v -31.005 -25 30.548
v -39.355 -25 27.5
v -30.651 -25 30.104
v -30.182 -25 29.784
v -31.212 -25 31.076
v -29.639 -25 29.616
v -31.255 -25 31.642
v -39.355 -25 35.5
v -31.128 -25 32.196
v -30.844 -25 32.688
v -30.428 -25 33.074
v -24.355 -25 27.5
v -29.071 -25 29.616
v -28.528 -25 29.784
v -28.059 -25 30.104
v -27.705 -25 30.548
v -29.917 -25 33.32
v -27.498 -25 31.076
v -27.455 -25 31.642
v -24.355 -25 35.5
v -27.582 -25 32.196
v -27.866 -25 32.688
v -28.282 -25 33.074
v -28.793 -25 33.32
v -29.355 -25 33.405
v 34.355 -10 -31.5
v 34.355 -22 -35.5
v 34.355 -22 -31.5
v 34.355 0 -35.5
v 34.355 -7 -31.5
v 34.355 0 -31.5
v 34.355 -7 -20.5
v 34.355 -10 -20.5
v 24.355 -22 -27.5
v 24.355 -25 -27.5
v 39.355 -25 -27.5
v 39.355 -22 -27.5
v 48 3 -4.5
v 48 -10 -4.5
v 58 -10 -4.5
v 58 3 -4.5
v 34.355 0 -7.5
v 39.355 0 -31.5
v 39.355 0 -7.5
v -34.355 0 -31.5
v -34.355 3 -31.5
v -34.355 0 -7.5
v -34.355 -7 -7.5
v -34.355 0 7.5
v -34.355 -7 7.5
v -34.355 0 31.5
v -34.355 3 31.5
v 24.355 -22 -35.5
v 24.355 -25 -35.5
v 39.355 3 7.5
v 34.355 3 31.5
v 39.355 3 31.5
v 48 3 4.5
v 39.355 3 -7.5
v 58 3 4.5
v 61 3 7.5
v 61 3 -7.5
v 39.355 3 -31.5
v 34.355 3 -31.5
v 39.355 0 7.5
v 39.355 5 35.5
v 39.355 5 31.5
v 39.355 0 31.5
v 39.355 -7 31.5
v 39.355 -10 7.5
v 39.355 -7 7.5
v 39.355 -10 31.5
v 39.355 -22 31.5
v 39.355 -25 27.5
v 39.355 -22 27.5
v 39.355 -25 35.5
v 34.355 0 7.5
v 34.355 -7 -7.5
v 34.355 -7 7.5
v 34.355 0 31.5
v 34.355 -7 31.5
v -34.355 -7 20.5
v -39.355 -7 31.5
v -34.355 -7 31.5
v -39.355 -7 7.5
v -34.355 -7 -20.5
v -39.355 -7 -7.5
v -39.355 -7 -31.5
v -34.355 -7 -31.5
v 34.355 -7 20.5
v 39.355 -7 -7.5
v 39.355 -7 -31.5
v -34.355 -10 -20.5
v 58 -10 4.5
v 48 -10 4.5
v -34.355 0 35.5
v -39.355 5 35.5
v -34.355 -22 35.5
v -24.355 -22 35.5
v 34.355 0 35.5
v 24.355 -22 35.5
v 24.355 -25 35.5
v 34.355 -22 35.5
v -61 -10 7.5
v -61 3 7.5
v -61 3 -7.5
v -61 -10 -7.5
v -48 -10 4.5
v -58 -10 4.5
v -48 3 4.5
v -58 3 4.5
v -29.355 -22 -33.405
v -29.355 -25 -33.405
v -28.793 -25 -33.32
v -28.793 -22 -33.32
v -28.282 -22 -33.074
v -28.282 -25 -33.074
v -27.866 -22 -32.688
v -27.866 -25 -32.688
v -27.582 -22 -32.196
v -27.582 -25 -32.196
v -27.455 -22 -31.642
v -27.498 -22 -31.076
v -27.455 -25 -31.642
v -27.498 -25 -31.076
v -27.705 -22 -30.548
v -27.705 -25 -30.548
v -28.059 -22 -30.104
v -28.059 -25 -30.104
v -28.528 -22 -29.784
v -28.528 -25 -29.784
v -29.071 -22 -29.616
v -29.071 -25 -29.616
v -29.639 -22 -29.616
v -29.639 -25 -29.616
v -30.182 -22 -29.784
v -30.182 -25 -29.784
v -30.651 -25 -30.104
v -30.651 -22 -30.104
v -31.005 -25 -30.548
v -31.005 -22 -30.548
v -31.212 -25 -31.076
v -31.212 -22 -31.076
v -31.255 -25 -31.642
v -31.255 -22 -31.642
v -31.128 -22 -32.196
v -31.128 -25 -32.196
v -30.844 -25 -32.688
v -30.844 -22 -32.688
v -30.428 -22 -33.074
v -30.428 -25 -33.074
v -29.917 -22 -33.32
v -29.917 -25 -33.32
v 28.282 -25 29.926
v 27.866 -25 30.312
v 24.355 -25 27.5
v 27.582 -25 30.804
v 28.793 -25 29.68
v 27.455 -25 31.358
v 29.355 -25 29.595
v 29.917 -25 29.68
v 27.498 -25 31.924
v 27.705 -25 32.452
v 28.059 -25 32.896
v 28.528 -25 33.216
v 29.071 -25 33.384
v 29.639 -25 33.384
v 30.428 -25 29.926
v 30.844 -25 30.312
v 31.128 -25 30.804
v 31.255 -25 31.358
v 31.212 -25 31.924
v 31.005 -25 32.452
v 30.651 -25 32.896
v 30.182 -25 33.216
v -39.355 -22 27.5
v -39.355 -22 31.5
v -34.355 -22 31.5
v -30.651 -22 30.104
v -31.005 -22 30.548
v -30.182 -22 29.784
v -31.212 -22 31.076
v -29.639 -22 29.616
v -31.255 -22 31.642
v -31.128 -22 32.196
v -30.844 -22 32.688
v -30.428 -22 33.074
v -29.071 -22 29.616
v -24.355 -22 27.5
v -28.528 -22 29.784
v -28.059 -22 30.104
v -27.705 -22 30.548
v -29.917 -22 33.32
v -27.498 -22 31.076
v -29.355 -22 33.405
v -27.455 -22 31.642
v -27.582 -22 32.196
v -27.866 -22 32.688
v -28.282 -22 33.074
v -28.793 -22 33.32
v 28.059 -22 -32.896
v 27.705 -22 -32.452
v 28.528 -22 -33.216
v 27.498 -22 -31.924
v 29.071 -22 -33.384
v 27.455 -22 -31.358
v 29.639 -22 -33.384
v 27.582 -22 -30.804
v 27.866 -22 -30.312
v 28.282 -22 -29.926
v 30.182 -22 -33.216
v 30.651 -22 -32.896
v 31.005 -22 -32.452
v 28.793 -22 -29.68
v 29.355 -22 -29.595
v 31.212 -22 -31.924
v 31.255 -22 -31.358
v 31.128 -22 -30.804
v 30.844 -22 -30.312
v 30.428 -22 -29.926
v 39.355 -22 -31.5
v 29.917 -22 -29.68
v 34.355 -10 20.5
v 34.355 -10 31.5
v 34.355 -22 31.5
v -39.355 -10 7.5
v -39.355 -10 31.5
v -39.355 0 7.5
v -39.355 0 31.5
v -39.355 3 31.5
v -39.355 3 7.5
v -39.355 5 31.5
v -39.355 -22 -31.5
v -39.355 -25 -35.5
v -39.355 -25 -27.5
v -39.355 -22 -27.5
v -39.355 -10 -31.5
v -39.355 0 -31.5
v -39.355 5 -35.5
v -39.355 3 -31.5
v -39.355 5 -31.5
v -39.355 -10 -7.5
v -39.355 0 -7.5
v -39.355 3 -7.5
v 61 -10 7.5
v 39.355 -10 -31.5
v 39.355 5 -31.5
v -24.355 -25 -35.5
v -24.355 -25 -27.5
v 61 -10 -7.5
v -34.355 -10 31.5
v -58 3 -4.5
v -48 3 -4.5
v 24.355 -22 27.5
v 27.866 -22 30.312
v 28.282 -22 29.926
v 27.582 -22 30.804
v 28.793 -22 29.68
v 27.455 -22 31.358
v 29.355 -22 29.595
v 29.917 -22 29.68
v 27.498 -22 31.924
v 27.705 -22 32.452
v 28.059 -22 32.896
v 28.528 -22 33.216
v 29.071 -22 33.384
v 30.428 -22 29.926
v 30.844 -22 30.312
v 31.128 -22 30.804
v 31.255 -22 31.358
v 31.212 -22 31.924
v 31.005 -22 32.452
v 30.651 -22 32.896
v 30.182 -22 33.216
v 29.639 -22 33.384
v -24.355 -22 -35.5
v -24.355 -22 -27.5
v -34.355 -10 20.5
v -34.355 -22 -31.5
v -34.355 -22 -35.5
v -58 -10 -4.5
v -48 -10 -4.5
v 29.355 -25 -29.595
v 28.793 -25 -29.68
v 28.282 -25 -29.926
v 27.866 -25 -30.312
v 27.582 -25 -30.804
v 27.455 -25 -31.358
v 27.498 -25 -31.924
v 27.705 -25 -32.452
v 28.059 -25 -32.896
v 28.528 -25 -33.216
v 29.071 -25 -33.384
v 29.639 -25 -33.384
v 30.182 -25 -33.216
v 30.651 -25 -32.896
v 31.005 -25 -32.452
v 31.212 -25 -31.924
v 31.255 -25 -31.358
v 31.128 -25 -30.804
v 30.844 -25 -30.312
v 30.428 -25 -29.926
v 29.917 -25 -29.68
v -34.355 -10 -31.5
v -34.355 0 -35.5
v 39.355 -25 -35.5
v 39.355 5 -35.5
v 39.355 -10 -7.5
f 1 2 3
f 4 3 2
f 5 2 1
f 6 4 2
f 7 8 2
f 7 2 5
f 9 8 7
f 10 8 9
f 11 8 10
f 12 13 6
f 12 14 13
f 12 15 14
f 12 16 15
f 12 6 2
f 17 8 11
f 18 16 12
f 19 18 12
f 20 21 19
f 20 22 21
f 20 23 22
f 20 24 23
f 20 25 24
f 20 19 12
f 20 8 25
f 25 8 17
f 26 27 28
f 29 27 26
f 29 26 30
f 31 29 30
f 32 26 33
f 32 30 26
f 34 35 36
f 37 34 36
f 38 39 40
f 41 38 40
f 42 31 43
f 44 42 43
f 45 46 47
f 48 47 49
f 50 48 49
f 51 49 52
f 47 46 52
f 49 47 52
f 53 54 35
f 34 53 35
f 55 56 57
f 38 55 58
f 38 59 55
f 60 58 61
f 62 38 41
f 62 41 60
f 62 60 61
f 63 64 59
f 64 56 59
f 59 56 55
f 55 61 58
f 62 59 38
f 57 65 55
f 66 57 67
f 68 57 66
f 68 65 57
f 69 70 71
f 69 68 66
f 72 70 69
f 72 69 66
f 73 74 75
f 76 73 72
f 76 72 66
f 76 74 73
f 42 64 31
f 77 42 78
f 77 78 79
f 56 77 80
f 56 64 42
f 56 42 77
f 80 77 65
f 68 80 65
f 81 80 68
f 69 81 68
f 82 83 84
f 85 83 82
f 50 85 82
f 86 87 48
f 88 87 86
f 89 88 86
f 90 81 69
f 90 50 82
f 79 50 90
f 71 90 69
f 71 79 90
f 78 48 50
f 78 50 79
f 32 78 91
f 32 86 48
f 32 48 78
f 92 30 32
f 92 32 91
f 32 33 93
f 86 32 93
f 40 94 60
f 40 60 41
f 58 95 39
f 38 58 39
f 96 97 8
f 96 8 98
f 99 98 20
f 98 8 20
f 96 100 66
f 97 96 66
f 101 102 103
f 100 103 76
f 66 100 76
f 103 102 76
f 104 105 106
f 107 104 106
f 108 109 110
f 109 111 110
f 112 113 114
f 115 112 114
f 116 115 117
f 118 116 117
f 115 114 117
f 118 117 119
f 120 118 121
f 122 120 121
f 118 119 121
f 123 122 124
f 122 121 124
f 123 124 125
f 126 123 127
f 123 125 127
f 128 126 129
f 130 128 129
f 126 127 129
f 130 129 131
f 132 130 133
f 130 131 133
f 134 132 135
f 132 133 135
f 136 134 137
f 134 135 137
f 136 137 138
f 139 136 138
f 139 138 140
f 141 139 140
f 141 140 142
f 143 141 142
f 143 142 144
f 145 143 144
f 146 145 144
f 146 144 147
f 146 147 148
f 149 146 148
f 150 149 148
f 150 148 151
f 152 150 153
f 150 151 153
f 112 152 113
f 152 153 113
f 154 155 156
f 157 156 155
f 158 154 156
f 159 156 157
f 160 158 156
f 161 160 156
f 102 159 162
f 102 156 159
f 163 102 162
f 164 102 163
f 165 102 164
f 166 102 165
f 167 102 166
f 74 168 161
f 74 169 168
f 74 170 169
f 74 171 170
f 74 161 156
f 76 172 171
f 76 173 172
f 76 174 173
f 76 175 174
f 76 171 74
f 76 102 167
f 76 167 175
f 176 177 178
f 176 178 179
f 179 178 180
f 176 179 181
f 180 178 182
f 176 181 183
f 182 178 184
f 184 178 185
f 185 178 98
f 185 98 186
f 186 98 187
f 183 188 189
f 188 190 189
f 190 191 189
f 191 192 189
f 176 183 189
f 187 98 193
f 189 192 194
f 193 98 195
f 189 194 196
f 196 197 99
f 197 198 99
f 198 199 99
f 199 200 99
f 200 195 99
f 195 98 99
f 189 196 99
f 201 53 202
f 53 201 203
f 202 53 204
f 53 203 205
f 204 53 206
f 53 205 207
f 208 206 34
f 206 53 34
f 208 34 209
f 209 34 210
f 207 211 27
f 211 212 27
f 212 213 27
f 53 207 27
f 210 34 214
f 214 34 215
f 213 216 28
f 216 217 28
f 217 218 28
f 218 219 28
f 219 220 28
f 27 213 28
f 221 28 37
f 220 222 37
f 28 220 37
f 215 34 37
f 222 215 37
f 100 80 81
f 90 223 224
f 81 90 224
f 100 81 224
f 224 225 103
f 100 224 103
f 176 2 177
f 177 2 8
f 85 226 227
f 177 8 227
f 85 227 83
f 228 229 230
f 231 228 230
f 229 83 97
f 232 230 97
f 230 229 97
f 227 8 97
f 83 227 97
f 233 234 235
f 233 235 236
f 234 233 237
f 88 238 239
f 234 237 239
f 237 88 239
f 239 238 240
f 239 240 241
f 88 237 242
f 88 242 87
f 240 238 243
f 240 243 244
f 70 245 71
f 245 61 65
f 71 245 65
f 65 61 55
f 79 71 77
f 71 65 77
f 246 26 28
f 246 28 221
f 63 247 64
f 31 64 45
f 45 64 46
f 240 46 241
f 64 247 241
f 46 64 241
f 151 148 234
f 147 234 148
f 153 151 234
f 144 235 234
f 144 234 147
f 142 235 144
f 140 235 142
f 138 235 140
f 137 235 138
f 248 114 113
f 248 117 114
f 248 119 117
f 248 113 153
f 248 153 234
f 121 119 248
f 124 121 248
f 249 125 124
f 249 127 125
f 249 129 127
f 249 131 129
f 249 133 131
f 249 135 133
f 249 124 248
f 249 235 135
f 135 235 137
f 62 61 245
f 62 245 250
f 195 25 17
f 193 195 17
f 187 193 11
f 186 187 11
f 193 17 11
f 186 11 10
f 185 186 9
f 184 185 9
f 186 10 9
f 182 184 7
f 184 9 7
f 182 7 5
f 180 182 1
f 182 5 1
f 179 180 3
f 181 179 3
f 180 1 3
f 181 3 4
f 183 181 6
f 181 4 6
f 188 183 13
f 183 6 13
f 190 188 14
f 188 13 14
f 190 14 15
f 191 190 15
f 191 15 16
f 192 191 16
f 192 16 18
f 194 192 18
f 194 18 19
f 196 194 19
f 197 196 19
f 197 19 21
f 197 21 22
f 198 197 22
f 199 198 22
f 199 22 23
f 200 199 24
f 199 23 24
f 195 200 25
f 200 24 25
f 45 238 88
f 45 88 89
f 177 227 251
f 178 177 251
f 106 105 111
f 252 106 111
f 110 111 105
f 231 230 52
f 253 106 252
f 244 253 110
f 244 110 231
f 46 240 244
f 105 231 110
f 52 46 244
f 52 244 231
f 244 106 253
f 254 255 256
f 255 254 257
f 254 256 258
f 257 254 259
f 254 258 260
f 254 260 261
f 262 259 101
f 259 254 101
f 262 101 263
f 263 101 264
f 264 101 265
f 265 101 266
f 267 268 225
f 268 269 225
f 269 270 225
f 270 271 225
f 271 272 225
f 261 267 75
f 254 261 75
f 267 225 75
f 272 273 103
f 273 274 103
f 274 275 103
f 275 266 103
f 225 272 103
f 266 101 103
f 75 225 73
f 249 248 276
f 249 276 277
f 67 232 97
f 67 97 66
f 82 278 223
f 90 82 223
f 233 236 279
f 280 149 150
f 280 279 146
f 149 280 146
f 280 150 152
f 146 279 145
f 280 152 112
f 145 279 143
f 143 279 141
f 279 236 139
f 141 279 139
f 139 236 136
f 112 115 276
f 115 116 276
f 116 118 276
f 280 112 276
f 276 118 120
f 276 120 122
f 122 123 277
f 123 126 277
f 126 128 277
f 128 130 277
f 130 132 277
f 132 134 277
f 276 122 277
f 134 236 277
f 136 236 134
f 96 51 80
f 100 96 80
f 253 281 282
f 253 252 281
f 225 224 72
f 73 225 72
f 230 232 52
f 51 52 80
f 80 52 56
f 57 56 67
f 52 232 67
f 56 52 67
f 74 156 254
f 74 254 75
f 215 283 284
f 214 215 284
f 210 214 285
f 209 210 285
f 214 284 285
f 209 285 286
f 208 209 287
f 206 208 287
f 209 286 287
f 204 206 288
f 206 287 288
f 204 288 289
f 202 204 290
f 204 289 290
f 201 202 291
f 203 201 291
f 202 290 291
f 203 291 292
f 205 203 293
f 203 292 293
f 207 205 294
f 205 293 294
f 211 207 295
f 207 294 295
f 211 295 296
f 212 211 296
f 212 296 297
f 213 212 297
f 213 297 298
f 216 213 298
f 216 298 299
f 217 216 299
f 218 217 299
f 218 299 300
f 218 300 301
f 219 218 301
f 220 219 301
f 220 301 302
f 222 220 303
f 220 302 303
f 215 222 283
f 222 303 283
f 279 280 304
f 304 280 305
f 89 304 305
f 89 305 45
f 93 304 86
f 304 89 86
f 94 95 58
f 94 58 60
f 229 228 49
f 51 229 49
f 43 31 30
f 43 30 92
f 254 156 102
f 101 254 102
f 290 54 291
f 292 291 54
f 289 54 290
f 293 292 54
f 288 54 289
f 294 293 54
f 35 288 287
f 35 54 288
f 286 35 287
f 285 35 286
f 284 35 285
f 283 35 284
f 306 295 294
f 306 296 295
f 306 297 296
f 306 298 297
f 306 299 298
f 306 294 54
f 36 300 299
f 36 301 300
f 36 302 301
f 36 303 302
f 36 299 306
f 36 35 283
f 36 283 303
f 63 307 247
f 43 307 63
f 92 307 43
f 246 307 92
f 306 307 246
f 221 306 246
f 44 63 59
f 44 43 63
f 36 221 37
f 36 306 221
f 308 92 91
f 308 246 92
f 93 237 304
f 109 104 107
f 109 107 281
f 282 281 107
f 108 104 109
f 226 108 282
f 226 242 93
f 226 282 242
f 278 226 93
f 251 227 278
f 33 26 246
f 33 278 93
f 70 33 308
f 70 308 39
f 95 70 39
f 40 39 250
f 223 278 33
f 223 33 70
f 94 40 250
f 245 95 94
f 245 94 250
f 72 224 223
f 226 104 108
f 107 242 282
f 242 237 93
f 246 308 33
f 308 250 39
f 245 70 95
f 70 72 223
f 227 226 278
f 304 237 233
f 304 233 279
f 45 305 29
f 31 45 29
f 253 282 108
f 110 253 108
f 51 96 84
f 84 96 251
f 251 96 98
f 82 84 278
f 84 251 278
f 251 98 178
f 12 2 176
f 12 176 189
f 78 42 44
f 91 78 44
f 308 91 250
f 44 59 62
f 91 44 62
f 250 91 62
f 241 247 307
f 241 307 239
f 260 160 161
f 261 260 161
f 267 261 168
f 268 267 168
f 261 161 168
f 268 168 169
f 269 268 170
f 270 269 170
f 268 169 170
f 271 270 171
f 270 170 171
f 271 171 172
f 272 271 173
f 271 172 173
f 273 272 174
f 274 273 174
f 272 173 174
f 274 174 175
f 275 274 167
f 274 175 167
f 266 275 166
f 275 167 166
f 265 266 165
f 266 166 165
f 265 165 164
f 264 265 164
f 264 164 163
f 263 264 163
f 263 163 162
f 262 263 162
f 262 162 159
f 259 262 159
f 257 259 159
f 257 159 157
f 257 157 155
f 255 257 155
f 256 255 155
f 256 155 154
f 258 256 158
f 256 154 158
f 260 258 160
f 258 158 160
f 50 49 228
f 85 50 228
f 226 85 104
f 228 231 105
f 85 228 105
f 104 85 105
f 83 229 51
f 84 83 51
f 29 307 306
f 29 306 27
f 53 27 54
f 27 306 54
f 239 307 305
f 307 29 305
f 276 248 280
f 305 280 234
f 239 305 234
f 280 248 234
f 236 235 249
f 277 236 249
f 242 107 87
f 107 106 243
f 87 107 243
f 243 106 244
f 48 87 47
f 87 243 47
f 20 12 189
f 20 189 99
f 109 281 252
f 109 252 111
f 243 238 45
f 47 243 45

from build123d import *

# Parameters (mm, degrees)
SKETCH1_W             = 5
SKETCH1_H             = 63
BOSS_EXTRUDE1_DEPTH   = 3
BOSS_EXTRUDE1_2_DEPTH = 3
SKETCH3_W             = 78.71
SKETCH3_H             = 5
BOSS_EXTRUDE3_DEPTH   = 4
SKETCH4_W             = 78.71
SKETCH4_H             = 5
BOSS_EXTRUDE4_DEPTH   = 4
SKETCH6_W             = 15
SKETCH6_H             = 3
BOSS_EXTRUDE5_DEPTH   = 5.645
SKETCH7_W             = 16
SKETCH7_H             = 15
SKETCH7_W_2           = 10
SKETCH7_H_2           = 9
BOSS_EXTRUDE6_DEPTH   = 3
SKETCH5_W             = 5
SKETCH5_H             = 4
LEGS_DEPTH            = 25
SKETCH12_W            = 15
SKETCH12_H            = 8
SKETCH12_R            = 1.905
BOSS_EXTRUDE10_DEPTH  = 3
SKETCH13_W            = 21.645
SKETCH13_H            = 15
SKETCH13_W_2          = 10
SKETCH13_H_2          = 9
COPY_2_DEPTH          = 3
BOSS_EXTRUDE11_DEPTH  = 3
SKETCH15_W            = 10
SKETCH15_H            = 9
BOSS_EXTRUDE12_DEPTH  = 10


with BuildPart() as part:
    # Sketch1 → Boss-Extrude1 (new body)
    with BuildSketch(Plane(origin=(0, 0, 0), x_dir=(1, 0, 0), z_dir=(0, 1, 0))):
        with Locations((-36.855, 0)):
            Rectangle(SKETCH1_W, SKETCH1_H)
    extrude(amount=BOSS_EXTRUDE1_DEPTH)



with BuildPart() as body_2:
    # Sketch1 → Boss-Extrude1 2 (new body)
    with BuildSketch(Plane(origin=(0, 0, 0), x_dir=(1, 0, 0), z_dir=(0, 1, 0))):
        with Locations((36.855, 0)):
            Rectangle(SKETCH1_W, SKETCH1_H)
    extrude(amount=BOSS_EXTRUDE1_2_DEPTH)


with BuildPart() as part_1:
    add(part.part)

    add(body_2.part)  # Boss-Extrude3 merges body 2
    # Sketch3 → Boss-Extrude3 (add)
    with BuildSketch(Plane.XY.offset(31.5)):
        with Locations((0, 2.5)):
            Rectangle(SKETCH3_W, SKETCH3_H)
    extrude(amount=BOSS_EXTRUDE3_DEPTH)

    # Sketch4 → Boss-Extrude4 (add)
    with BuildSketch(Plane(origin=(0, 0, -31.5), x_dir=(-1, 0, 0), z_dir=(0, 0, -1))):
        with Locations((0, 2.5)):
            Rectangle(SKETCH4_W, SKETCH4_H)
    extrude(amount=BOSS_EXTRUDE4_DEPTH)

    # Sketch6 → Boss-Extrude5 (add)
    with BuildSketch(Plane.ZY.offset(39.355)):
        with Locations((0, 1.5)):
            Rectangle(SKETCH6_W, SKETCH6_H)
    extrude(amount=BOSS_EXTRUDE5_DEPTH)

    # Sketch7 → Boss-Extrude6 (add)
    with BuildSketch(Plane(origin=(0, 3, 0), x_dir=(1, 0, 0), z_dir=(0, 1, 0))):
        with Locations((-53, 0)):
            Rectangle(SKETCH7_W, SKETCH7_H)
        with Locations((-53, 0)):
            Rectangle(SKETCH7_W_2, SKETCH7_H_2, mode=Mode.SUBTRACT)
    extrude(amount=-BOSS_EXTRUDE6_DEPTH)

    # Sketch5 → legs (add)
    with BuildSketch(Plane.XZ):
        with Locations((-36.855, 33.5)):
            Rectangle(SKETCH5_W, SKETCH5_H)
        with Locations((36.855, 33.5)):
            Rectangle(SKETCH5_W, SKETCH5_H)
        with Locations((-36.855, -33.5)):
            Rectangle(SKETCH5_W, SKETCH5_H)
        with Locations((36.855, -33.5)):
            Rectangle(SKETCH5_W, SKETCH5_H)
    extrude(amount=LEGS_DEPTH)

    # Sketch12 → Boss-Extrude10 (add)
    # profile 1 of 4: a face of its own
    with BuildSketch(Plane.XZ.offset(25)):
        with Locations((31.855, 31.5)):
            Rectangle(SKETCH12_W, SKETCH12_H)
        with Locations(Location((29.355, 31.5, 0), (0, 0, 270))):
            Circle(SKETCH12_R, mode=Mode.SUBTRACT)
    # profile 2 of 4: a face of its own
    with BuildSketch(Plane.XZ.offset(25)):
        with Locations((31.855, -31.5)):
            Rectangle(SKETCH12_W, SKETCH12_H)
        with Locations(Location((29.355, -31.5, 0), (0, 0, 90))):
            Circle(SKETCH12_R, mode=Mode.SUBTRACT)
    # profile 3 of 4: a face of its own
    with BuildSketch(Plane.XZ.offset(25)):
        with Locations((-31.855, -31.5)):
            Rectangle(SKETCH12_W, SKETCH12_H)
        with Locations(Location((-29.355, -31.5, 0), (0, 0, 270))):
            Circle(SKETCH12_R, mode=Mode.SUBTRACT)
    # profile 4 of 4: a face of its own
    with BuildSketch(Plane.XZ.offset(25)):
        with Locations((-31.855, 31.5)):
            Rectangle(SKETCH12_W, SKETCH12_H)
        with Locations(Location((-29.355, 31.5, 0), (0, 0, 90))):
            Circle(SKETCH12_R, mode=Mode.SUBTRACT)
    extrude(amount=-BOSS_EXTRUDE10_DEPTH)

    # Sketch13 → copy 2 (add)
    with BuildSketch(Plane(origin=(0, 3, 0), x_dir=(1, 0, 0), z_dir=(0, 1, 0))):
        with Locations((50.1775, 0)):
            Rectangle(SKETCH13_W, SKETCH13_H)
        with Locations((53, 0)):
            Rectangle(SKETCH13_W_2, SKETCH13_H_2, mode=Mode.SUBTRACT)
    extrude(amount=-COPY_2_DEPTH)

    # Sketch14 → Boss-Extrude11 (add)
    with BuildSketch(Plane(origin=(0, -10, 0), x_dir=(-1, 0, 0), z_dir=(0, -1, 0))):
        Polygon((-39.355, 35.5), (-34.355, 35.5), (-34.355, 20.5), (34.355, 20.5), (34.355, 35.5), (39.355, 35.5), (39.355, -35.5), (34.355, -35.5), (34.355, -20.5), (-34.355, -20.5), (-34.355, -35.5), (-39.355, -35.5), align=None)
    extrude(amount=-BOSS_EXTRUDE11_DEPTH)

    # Sketch15 → Boss-Extrude12 (add)
    # profile 1 of 2: a face of its own
    with BuildSketch(Plane.XZ):
        Polygon((-61, 7.5), (-61, -7.5), (-39.355, -7.5), (-34.355, -7.5), (-34.355, 7.5), (-39.355, 7.5), align=None)
        with Locations((-53, 0)):
            Rectangle(SKETCH15_W, SKETCH15_H, mode=Mode.SUBTRACT)
    # profile 2 of 2: a face of its own
    with BuildSketch(Plane.XZ):
        Polygon((34.355, -7.5), (34.355, 7.5), (39.355, 7.5), (61, 7.5), (61, -7.5), (39.355, -7.5), align=None)
        with Locations((53, 0)):
            Rectangle(SKETCH15_W, SKETCH15_H, mode=Mode.SUBTRACT)
    extrude(amount=BOSS_EXTRUDE12_DEPTH)


solid = part_1.part
